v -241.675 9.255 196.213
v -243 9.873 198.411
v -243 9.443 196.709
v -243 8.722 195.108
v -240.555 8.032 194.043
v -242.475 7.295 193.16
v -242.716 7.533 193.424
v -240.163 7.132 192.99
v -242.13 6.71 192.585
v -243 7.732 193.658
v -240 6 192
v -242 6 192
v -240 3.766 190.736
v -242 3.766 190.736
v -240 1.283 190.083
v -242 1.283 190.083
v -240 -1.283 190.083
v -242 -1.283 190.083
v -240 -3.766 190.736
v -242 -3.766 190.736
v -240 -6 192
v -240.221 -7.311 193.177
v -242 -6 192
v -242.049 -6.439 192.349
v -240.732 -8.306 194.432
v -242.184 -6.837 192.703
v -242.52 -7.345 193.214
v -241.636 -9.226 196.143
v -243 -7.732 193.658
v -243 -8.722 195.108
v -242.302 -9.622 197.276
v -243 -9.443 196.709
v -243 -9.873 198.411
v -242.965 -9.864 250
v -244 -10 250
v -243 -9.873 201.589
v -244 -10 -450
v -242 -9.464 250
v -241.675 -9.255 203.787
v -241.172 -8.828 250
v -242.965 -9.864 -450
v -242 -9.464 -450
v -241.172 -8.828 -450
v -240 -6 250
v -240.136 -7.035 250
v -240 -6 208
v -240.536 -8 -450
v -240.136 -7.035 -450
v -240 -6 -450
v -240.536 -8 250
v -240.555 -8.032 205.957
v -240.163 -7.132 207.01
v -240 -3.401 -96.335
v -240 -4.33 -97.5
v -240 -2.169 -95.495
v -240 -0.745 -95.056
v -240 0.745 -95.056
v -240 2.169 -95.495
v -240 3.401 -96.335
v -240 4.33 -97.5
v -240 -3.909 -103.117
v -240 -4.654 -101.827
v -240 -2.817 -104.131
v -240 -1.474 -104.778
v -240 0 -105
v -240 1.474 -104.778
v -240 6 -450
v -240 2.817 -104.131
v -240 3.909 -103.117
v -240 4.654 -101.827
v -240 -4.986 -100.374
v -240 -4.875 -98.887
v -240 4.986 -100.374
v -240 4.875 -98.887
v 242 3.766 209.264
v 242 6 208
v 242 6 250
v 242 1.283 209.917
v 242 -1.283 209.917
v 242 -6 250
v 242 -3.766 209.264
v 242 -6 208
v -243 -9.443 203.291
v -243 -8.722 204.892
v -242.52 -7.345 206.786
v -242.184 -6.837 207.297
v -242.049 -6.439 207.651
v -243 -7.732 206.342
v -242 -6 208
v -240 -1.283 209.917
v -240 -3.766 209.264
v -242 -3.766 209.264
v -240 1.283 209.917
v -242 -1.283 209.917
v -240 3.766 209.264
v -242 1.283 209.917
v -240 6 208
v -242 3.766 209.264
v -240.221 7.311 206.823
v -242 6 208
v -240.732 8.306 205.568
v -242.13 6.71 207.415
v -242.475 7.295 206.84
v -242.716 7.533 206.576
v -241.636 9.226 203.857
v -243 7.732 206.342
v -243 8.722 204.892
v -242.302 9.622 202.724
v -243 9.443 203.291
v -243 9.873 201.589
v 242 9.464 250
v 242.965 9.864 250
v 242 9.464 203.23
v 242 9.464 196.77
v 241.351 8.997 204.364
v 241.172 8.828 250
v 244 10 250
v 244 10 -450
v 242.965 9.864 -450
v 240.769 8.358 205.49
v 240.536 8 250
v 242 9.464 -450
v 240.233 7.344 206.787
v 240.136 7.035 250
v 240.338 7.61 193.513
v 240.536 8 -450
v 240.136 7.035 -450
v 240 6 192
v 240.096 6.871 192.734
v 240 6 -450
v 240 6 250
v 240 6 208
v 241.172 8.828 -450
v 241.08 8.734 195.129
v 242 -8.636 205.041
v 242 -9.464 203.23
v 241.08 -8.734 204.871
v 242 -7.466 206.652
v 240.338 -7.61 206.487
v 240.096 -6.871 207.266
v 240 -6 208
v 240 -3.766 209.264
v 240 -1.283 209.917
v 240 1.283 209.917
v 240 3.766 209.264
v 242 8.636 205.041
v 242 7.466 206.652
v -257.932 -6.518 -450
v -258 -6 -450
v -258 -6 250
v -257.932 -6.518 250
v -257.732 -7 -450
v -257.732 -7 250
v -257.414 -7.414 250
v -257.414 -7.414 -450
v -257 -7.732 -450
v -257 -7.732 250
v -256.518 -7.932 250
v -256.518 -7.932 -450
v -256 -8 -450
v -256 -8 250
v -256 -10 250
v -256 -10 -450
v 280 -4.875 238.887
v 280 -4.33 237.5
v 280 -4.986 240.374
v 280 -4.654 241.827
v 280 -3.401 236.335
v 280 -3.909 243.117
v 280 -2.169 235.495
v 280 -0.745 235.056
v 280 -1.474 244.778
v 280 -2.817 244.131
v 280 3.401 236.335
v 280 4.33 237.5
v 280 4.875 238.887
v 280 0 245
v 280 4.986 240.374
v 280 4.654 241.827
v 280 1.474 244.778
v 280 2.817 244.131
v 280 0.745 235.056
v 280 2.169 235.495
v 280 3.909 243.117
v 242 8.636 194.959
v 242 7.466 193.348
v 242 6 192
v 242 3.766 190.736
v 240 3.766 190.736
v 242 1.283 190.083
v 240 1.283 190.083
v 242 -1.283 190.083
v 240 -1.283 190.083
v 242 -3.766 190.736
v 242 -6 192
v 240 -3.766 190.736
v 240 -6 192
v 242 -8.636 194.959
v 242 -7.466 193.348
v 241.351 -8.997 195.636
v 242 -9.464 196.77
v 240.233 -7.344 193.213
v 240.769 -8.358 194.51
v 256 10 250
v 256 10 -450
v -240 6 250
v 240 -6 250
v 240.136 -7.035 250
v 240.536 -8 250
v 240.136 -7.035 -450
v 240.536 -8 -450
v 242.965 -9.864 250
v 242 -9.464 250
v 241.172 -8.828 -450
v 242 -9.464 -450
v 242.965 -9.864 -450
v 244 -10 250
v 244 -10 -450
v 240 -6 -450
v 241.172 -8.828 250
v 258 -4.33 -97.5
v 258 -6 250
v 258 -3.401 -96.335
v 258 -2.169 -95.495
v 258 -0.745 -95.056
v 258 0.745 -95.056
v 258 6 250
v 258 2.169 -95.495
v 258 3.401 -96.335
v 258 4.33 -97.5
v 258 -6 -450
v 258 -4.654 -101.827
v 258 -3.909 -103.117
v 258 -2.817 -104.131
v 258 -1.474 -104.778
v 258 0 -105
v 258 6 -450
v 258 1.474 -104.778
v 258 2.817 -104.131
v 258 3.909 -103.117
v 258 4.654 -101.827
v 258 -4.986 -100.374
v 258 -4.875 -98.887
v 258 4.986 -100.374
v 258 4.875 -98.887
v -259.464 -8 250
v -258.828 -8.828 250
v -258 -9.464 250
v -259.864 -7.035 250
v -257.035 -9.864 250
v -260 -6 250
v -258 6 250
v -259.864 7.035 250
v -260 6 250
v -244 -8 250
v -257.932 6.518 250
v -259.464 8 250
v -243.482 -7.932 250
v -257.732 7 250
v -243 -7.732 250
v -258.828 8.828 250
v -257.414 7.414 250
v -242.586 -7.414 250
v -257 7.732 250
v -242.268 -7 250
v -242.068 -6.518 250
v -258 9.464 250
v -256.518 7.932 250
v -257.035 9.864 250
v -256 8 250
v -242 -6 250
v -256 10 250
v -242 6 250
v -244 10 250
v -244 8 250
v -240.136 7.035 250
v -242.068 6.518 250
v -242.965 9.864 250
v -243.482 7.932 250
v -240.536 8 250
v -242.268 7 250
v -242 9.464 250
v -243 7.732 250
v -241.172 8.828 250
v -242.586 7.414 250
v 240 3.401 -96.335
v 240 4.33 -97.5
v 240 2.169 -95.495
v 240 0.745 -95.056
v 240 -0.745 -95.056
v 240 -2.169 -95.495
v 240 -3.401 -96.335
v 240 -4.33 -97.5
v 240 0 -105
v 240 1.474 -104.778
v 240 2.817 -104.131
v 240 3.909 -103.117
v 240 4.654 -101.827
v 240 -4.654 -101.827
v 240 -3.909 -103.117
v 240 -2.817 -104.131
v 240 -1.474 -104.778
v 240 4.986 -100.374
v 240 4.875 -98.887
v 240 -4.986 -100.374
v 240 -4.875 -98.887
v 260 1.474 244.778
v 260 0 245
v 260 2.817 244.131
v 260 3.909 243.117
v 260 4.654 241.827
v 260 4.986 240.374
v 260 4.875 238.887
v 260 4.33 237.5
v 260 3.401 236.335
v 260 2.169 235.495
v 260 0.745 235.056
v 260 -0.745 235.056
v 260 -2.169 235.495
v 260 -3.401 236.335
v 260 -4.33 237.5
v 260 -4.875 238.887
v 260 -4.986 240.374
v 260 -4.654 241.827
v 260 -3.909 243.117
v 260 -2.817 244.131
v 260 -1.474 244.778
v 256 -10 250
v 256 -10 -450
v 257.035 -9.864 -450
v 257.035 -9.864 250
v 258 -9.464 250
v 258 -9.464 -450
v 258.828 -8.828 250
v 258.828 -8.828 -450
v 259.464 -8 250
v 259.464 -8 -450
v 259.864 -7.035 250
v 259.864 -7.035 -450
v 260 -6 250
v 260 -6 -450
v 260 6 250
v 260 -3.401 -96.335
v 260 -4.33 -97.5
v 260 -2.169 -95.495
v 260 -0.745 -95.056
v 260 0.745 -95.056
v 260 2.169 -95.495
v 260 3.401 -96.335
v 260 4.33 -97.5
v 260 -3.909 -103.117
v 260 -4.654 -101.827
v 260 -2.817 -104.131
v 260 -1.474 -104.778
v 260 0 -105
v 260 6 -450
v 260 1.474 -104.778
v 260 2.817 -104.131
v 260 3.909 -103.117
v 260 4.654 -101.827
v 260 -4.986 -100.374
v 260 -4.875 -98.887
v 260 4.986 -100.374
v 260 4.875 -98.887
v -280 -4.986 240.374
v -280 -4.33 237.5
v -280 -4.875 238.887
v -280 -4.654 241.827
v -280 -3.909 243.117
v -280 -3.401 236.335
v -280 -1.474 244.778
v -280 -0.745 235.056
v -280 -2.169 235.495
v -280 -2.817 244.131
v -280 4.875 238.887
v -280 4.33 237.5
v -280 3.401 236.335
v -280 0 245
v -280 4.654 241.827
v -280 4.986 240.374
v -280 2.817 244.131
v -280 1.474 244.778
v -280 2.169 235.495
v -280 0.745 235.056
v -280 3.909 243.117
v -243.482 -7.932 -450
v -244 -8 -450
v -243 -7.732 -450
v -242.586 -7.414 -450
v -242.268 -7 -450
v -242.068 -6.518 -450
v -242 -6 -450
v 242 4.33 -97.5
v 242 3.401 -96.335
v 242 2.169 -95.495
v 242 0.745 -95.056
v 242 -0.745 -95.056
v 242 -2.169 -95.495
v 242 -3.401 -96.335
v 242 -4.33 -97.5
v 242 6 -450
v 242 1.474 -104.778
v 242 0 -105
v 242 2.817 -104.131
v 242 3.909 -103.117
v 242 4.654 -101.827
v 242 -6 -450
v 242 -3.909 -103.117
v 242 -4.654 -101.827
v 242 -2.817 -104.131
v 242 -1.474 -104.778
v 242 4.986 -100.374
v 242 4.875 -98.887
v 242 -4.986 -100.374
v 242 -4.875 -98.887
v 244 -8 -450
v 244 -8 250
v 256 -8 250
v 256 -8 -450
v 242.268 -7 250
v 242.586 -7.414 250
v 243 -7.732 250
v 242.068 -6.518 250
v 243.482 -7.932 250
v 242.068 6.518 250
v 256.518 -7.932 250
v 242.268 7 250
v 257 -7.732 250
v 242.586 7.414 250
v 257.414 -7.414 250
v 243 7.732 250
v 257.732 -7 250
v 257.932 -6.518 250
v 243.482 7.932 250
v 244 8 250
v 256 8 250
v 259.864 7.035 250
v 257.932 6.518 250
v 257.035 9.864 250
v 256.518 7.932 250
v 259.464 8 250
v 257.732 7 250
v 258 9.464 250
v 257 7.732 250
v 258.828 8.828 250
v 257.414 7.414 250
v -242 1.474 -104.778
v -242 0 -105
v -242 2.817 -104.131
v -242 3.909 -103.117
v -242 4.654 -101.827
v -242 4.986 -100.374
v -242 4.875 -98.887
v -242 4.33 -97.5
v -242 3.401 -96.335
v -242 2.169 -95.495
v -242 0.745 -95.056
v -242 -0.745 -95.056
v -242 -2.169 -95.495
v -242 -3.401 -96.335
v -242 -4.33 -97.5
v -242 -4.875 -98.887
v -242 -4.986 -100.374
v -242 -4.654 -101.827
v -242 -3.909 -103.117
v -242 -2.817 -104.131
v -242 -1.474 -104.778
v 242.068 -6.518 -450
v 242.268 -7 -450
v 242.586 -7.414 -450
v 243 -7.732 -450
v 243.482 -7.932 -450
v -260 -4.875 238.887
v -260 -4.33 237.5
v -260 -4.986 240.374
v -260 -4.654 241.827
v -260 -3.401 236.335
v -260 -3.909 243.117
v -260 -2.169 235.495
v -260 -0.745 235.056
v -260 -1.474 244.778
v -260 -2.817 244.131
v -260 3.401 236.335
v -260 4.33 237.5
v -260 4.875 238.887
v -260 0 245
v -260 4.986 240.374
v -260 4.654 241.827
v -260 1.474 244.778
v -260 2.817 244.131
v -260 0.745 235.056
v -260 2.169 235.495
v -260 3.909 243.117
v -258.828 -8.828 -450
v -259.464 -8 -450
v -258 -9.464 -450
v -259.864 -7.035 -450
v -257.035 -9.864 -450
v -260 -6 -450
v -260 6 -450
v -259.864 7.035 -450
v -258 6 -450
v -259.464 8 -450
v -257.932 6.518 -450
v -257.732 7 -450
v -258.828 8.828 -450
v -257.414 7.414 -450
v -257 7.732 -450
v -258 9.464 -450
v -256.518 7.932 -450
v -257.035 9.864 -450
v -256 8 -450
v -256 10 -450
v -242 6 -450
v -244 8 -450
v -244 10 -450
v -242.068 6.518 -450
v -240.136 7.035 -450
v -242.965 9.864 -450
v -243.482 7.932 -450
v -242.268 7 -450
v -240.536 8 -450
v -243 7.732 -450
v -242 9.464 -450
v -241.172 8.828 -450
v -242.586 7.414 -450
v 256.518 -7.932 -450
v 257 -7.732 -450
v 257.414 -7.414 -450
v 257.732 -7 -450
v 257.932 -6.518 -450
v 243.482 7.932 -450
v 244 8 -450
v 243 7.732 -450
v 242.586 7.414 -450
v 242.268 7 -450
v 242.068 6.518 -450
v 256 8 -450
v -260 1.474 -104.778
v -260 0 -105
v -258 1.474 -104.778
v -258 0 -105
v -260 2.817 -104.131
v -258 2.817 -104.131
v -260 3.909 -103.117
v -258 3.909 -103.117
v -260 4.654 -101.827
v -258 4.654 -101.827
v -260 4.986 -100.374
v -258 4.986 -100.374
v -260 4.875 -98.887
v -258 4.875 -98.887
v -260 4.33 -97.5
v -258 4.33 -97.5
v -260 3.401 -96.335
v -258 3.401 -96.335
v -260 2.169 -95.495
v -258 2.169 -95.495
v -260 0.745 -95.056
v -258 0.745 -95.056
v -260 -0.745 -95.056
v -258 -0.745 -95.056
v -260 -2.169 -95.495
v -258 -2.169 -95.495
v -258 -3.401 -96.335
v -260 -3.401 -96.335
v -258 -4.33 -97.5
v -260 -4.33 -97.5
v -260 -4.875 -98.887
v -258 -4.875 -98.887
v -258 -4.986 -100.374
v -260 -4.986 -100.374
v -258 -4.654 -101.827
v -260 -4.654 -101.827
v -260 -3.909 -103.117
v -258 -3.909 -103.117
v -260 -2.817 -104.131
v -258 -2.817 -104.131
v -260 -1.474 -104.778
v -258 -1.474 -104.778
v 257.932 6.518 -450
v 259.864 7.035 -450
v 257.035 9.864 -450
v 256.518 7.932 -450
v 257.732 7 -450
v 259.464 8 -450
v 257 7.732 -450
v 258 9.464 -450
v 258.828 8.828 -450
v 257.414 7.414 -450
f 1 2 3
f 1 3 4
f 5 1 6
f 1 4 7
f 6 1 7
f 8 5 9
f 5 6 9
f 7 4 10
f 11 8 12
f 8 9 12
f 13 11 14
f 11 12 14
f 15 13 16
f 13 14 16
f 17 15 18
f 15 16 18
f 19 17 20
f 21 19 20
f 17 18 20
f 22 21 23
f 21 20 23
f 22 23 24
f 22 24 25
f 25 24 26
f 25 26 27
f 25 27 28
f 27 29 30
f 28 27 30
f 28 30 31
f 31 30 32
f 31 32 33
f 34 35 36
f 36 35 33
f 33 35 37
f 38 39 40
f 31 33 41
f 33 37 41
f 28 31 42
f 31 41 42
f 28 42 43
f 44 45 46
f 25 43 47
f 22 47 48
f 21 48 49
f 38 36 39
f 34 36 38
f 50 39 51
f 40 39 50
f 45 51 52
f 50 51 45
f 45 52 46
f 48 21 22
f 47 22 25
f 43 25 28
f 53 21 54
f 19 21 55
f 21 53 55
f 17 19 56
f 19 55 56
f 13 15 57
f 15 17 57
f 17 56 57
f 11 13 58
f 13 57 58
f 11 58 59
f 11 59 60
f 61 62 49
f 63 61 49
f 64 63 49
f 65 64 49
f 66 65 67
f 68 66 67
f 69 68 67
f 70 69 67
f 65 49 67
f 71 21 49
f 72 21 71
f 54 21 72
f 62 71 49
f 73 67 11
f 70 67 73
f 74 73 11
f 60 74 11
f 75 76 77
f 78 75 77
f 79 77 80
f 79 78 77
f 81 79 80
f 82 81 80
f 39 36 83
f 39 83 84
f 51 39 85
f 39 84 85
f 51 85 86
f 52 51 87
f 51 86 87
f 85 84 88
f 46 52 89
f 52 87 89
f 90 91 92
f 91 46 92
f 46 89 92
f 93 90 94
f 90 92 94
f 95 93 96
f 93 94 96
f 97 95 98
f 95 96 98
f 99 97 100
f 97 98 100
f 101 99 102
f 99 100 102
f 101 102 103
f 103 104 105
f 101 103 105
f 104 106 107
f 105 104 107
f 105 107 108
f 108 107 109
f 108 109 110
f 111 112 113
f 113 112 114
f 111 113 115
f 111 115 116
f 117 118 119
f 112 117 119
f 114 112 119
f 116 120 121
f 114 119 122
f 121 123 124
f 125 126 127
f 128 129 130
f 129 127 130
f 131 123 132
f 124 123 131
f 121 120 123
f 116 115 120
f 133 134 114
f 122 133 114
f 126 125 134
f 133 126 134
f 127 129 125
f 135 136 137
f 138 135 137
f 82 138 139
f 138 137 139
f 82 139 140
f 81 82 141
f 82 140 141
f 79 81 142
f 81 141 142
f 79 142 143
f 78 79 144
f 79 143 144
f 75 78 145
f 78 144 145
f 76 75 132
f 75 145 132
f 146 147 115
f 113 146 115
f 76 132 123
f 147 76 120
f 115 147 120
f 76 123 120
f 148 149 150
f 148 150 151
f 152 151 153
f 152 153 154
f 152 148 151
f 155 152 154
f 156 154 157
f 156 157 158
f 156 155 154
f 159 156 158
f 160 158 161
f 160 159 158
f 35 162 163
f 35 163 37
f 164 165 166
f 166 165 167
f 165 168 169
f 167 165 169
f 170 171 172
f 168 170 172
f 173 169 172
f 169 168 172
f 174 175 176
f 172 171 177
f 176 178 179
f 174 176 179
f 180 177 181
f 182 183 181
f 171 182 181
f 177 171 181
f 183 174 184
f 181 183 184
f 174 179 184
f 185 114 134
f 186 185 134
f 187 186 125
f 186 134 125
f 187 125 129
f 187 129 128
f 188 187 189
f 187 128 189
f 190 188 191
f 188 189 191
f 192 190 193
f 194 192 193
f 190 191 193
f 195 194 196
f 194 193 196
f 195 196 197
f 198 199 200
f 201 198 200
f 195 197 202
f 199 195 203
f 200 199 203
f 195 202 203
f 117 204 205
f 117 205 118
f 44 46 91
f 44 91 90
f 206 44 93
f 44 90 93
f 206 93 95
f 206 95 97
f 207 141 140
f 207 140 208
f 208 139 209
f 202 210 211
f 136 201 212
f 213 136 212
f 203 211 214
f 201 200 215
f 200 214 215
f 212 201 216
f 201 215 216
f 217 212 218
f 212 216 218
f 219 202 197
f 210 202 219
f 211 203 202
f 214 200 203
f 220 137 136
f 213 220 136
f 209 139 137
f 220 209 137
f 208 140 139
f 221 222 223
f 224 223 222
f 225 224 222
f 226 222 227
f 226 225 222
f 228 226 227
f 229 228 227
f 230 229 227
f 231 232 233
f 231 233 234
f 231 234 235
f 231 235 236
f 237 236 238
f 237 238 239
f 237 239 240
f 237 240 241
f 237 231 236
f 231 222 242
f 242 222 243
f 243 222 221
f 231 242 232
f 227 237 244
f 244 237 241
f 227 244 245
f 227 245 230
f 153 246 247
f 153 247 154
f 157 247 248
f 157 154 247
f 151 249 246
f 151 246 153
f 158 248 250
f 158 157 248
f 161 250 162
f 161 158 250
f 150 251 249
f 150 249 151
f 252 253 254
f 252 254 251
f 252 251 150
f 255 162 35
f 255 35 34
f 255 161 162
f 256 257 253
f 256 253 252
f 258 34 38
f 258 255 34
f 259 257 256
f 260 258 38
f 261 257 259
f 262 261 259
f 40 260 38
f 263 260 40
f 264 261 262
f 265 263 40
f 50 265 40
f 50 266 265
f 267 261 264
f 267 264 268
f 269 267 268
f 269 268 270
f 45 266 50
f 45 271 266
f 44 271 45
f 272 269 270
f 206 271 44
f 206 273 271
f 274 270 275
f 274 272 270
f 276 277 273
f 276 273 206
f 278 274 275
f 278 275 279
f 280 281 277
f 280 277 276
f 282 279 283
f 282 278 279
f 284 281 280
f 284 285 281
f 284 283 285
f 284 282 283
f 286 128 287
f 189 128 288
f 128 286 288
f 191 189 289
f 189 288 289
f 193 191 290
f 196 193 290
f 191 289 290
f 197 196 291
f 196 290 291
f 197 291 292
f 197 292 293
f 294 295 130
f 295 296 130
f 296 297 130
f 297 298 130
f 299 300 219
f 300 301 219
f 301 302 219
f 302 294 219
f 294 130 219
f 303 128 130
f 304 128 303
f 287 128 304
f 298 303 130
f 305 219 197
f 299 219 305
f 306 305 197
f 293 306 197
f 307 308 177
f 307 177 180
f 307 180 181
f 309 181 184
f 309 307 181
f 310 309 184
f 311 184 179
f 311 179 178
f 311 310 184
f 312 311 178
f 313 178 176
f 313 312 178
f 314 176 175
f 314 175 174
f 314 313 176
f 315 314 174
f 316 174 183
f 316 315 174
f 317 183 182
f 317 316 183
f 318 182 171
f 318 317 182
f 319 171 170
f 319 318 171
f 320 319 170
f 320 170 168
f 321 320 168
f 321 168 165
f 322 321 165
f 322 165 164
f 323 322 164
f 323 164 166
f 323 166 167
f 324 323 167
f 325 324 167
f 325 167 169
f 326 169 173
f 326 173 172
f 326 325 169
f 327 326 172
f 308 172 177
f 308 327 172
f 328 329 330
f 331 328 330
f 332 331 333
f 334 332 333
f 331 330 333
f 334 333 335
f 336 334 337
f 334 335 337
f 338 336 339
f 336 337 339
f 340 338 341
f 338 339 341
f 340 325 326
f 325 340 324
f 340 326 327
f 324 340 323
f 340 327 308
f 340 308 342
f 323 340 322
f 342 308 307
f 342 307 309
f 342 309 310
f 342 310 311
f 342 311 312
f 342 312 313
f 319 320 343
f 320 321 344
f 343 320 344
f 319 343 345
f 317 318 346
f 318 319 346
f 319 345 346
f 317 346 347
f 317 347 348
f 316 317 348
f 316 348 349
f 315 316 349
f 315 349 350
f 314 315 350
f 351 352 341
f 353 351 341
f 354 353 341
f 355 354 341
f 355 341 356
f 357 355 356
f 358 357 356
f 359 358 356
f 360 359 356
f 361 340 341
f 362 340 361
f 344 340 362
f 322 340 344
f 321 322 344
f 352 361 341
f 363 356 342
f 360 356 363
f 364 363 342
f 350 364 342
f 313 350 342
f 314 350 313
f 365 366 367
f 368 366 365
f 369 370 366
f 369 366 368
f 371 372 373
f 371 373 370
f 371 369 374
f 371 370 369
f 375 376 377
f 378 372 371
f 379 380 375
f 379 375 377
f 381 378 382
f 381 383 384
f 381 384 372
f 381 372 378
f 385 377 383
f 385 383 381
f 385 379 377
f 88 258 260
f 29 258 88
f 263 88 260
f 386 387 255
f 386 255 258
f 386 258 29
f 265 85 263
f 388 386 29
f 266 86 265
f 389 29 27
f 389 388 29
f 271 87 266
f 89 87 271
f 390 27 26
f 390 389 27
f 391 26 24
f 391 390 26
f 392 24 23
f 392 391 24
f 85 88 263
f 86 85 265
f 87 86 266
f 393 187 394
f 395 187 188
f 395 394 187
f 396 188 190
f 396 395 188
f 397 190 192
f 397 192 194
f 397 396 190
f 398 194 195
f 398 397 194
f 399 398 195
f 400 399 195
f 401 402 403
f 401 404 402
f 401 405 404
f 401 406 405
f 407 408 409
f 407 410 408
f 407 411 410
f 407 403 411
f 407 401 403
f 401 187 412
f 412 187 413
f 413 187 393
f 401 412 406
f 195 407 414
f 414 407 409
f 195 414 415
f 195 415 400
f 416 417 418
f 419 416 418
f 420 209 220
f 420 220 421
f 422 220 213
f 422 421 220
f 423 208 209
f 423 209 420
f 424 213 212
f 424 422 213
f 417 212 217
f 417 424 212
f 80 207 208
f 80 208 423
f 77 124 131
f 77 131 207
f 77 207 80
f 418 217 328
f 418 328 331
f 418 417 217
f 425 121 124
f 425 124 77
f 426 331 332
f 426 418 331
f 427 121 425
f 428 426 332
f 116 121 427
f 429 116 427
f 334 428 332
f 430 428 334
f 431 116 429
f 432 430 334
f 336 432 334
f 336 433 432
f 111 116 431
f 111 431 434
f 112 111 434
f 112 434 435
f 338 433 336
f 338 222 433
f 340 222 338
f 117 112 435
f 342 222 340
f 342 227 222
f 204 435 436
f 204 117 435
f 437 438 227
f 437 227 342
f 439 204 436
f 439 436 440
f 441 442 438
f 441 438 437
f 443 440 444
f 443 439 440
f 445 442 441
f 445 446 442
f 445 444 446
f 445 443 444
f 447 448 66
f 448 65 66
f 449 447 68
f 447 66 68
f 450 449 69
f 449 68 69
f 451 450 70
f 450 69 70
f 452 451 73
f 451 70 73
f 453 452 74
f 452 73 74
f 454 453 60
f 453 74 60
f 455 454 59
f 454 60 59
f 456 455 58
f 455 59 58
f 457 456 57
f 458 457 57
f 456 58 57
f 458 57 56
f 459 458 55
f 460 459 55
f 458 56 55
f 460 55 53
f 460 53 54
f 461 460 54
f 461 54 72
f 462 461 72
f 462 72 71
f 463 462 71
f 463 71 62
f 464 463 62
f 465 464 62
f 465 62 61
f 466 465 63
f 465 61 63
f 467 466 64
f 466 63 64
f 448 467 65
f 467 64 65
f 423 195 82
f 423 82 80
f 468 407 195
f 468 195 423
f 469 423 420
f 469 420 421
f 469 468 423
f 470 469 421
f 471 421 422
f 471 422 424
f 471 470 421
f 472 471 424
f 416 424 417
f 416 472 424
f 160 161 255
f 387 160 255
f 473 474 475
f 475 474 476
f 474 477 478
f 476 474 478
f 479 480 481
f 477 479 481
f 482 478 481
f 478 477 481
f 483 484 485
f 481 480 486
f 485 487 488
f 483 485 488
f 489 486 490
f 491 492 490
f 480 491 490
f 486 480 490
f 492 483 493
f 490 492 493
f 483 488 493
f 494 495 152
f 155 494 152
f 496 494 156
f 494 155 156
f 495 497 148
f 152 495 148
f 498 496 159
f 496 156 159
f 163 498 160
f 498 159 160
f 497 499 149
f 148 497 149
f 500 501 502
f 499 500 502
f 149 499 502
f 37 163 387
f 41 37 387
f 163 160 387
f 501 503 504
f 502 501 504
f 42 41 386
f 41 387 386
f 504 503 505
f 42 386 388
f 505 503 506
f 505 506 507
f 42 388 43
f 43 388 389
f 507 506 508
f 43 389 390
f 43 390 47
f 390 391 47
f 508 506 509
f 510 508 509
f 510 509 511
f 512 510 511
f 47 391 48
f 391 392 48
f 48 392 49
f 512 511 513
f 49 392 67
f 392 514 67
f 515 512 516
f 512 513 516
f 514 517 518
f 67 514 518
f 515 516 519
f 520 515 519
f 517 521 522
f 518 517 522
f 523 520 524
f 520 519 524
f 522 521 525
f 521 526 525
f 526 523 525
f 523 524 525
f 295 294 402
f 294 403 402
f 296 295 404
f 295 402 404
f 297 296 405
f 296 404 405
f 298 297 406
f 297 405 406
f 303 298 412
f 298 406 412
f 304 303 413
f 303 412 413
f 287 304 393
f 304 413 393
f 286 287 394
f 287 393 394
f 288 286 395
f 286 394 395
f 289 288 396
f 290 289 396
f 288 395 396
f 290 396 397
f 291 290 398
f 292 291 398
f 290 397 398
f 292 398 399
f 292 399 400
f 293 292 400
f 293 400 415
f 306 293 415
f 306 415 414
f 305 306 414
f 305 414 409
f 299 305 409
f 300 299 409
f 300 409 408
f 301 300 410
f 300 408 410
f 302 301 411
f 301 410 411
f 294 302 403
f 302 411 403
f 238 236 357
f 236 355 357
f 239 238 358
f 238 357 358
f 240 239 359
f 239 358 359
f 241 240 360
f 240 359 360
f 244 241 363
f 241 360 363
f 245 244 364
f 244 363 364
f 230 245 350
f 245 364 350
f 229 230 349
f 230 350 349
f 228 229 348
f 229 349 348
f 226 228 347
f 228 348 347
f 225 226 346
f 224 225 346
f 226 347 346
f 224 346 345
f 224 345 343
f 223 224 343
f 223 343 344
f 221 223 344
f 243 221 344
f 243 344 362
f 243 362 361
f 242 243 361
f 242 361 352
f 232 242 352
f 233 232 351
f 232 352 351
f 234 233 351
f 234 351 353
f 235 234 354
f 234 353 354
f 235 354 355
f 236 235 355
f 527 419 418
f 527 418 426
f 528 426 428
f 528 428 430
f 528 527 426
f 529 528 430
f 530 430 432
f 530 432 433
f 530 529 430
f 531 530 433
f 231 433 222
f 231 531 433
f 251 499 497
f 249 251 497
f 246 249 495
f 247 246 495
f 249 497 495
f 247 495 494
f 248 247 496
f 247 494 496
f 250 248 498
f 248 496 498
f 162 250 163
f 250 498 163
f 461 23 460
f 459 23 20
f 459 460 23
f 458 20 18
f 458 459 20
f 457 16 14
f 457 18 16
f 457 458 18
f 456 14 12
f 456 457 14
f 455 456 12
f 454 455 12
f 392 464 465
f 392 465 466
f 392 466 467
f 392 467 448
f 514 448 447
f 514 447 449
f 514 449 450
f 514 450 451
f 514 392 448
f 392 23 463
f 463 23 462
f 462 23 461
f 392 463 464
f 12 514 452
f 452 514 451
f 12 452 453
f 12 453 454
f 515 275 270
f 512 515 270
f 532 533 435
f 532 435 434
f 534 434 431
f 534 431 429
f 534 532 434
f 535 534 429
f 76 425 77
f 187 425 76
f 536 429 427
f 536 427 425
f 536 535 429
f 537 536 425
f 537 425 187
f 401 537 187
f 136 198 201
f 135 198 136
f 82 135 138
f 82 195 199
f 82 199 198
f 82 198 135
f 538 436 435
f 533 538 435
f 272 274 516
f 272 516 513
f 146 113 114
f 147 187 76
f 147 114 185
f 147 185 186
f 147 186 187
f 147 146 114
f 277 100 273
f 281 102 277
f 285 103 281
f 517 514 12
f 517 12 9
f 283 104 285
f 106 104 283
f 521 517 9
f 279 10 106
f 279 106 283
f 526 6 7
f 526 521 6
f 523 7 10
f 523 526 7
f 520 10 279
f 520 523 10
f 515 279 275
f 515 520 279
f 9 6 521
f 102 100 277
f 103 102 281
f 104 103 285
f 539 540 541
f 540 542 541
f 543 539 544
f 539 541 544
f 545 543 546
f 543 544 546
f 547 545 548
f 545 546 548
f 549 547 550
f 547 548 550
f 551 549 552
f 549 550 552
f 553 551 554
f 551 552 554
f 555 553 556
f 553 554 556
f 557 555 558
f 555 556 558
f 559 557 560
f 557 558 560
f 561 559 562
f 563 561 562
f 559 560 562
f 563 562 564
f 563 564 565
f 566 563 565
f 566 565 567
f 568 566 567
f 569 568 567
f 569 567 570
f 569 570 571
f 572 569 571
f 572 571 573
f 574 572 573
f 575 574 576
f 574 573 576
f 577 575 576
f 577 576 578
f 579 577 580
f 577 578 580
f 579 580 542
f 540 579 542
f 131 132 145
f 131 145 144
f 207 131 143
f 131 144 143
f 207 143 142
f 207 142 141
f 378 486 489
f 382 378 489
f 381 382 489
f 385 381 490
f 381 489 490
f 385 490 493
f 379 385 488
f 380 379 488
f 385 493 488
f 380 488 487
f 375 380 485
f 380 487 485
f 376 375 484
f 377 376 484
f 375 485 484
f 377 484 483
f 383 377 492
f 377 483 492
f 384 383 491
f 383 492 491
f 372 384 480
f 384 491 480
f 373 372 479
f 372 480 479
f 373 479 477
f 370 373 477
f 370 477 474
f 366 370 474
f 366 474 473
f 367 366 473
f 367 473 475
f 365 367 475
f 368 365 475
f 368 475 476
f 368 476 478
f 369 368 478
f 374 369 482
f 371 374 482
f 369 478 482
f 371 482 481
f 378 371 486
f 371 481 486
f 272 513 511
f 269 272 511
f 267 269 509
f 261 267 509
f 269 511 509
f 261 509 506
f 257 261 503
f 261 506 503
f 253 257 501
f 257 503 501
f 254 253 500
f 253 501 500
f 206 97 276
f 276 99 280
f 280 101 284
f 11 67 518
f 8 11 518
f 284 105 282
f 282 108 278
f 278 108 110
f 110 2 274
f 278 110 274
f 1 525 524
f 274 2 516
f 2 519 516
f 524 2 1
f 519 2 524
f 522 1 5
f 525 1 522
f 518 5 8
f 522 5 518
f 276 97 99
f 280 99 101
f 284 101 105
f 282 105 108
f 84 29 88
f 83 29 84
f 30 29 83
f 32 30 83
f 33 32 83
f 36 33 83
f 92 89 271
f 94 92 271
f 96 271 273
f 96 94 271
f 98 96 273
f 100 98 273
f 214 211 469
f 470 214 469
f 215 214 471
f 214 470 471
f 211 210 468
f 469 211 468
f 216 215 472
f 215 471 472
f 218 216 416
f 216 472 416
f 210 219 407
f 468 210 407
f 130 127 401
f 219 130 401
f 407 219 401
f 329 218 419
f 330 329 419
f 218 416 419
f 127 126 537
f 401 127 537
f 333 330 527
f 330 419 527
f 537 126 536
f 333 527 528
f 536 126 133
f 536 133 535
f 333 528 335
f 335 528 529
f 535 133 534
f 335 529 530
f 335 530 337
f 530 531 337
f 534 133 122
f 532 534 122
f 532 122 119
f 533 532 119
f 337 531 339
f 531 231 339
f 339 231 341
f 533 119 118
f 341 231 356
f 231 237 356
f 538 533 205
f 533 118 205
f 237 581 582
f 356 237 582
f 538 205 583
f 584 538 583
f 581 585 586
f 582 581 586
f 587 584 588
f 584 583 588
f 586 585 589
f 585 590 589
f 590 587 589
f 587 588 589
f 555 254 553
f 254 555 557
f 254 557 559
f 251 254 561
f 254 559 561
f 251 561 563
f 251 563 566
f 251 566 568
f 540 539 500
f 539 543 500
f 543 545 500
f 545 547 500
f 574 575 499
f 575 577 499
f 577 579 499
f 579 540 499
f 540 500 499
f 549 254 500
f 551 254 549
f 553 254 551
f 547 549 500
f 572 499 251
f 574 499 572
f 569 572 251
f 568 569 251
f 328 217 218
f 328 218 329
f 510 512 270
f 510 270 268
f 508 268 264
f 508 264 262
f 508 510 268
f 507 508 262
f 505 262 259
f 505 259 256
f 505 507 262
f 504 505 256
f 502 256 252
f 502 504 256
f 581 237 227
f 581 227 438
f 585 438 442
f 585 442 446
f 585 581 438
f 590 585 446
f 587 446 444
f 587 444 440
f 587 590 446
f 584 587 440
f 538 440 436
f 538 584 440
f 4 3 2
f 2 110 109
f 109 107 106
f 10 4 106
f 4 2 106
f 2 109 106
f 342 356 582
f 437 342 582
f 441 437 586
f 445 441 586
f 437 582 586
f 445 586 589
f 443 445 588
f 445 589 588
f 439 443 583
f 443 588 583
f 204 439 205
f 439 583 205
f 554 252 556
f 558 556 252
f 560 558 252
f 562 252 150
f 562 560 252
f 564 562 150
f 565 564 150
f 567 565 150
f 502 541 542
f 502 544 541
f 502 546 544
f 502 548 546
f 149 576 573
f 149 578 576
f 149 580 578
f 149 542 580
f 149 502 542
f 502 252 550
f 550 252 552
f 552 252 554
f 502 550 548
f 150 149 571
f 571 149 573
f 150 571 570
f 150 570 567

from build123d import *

# Parameters (mm, degrees)
SQUARE_TUBE_CONFIGURED_20_X_20_X_2_1_DEPTH   = 700
SQUARE_TUBE_CONFIGURED_20_X_20_X_2_1_2_DEPTH = 700
SKETCH15_R                                   = 5
CUT_EXTRUDE1_DEPTH                           = 520.807656735
CUT_EXTRUDE1_DEPTH_BACK                      = 520.807656735
SKETCH16_R                                   = 5
BOSS_EXTRUDE2_DEPTH                          = 20
SKETCH13_R                                   = 10
CUT_EXTRUDE3_DEPTH                           = 483
CUT_EXTRUDE3_DEPTH_BACK                      = 2


with BuildPart() as part:
    # Sketch111 → Square tube - configured 20 X 20 X 2(1) (new body)
    with BuildSketch(Plane(origin=(-250, 0, -450), x_dir=(1, 0, 0), z_dir=(0, 0, 1))):
        with BuildLine():
            Line((-6, -10), (6, -10))
            ThreePointArc((6, -10), (8.828427125, -8.828427125), (10, -6))
            Line((10, -6), (10, 6))
            ThreePointArc((10, 6), (8.828427125, 8.828427125), (6, 10))
            Line((6, 10), (-6, 10))
            ThreePointArc((-6, 10), (-8.828427125, 8.828427125), (-10, 6))
            Line((-10, 6), (-10, -6))
            ThreePointArc((-10, -6), (-8.828427125, -8.828427125), (-6, -10))
        make_face()
        with BuildLine():
            Line((-6, -8), (6, -8))
            ThreePointArc((6, -8), (7.414213562, -7.414213562), (8, -6))
            Line((8, -6), (8, 6))
            ThreePointArc((8, 6), (7.414213562, 7.414213562), (6, 8))
            Line((6, 8), (-6, 8))
            ThreePointArc((-6, 8), (-7.414213562, 7.414213562), (-8, 6))
            Line((-8, 6), (-8, -6))
            ThreePointArc((-8, -6), (-7.414213562, -7.414213562), (-6, -8))
        make_face(mode=Mode.SUBTRACT)
    extrude(amount=SQUARE_TUBE_CONFIGURED_20_X_20_X_2_1_DEPTH)


with BuildPart() as body_2:
    # Sketch111 on segment 2 (carried to segment 2) → Square tube - configured 20 X 20 X 2_1 2 (new body)
    with BuildSketch(Plane(origin=(250, 0, -450), x_dir=(1, 0, 0), z_dir=(0, 0, 1))):
        with BuildLine():
            Line((-6, -10), (6, -10))
            ThreePointArc((6, -10), (8.828427125, -8.828427125), (10, -6))
            Line((10, -6), (10, 6))
            ThreePointArc((10, 6), (8.828427125, 8.828427125), (6, 10))
            Line((6, 10), (-6, 10))
            ThreePointArc((-6, 10), (-8.828427125, 8.828427125), (-10, 6))
            Line((-10, 6), (-10, -6))
            ThreePointArc((-10, -6), (-8.828427125, -8.828427125), (-6, -10))
        make_face()
        with BuildLine():
            Line((-6, -8), (6, -8))
            ThreePointArc((6, -8), (7.414213562, -7.414213562), (8, -6))
            Line((8, -6), (8, 6))
            ThreePointArc((8, 6), (7.414213562, 7.414213562), (6, 8))
            Line((6, 8), (-6, 8))
            ThreePointArc((-6, 8), (-7.414213562, 7.414213562), (-8, 6))
            Line((-8, 6), (-8, -6))
            ThreePointArc((-8, -6), (-7.414213562, -7.414213562), (-6, -8))
        make_face(mode=Mode.SUBTRACT)
    extrude(amount=SQUARE_TUBE_CONFIGURED_20_X_20_X_2_1_2_DEPTH)


with BuildPart() as cut_extrude1_tool:
    # Sketch15 → Cut-Extrude1 (new, two sides)
    with BuildSketch(Plane(origin=(0, 0, 0), x_dir=(0, 0, -1), z_dir=(1, 0, 0))) as cut_extrude1_sk:
        with Locations((100, 0)):
            Circle(SKETCH15_R)
    extrude(amount=CUT_EXTRUDE1_DEPTH)
    extrude(cut_extrude1_sk.sketch, amount=-CUT_EXTRUDE1_DEPTH_BACK)


with BuildPart() as part_1:
    add(part.part)

    # Cut-Extrude1: cut by cut_extrude1_tool
    add(cut_extrude1_tool.part, mode=Mode.SUBTRACT)


with BuildPart() as body_2_1:
    add(body_2.part)

    # Cut-Extrude1: cut by cut_extrude1_tool
    add(cut_extrude1_tool.part, mode=Mode.SUBTRACT)


with BuildPart() as body_3:
    # Sketch16 → Boss-Extrude2 (new body)
    with BuildSketch(Plane.ZY.offset(260)):
        with Locations((240, 0)):
            Circle(SKETCH16_R)
    boss_extrude2 = extrude(amount=BOSS_EXTRUDE2_DEPTH)


with BuildPart() as body_2_2:
    add(body_2_1.part)

    # Mirror2: Boss-Extrude2 across plane
    add(boss_extrude2.mirror(Plane(origin=(0, 0, 0), x_dir=(0, 0, 1), z_dir=(1, 0, 0))))


with BuildPart() as cut_extrude3_tool:
    # Sketch13 → Cut-Extrude3 (new, two sides)
    with BuildSketch(Plane.ZY.offset(-240)) as cut_extrude3_sk:
        with Locations((200, 0)):
            Circle(SKETCH13_R)
    extrude(amount=CUT_EXTRUDE3_DEPTH)
    extrude(cut_extrude3_sk.sketch, amount=-CUT_EXTRUDE3_DEPTH_BACK)


with BuildPart() as part_2:
    add(part_1.part)

    # Cut-Extrude3: cut by cut_extrude3_tool
    add(cut_extrude3_tool.part, mode=Mode.SUBTRACT)


with BuildPart() as body_2_3:
    add(body_2_2.part)

    # Cut-Extrude3: cut by cut_extrude3_tool
    add(cut_extrude3_tool.part, mode=Mode.SUBTRACT)


solid = Compound([body_3.part, part_2.part, body_2_3.part])
